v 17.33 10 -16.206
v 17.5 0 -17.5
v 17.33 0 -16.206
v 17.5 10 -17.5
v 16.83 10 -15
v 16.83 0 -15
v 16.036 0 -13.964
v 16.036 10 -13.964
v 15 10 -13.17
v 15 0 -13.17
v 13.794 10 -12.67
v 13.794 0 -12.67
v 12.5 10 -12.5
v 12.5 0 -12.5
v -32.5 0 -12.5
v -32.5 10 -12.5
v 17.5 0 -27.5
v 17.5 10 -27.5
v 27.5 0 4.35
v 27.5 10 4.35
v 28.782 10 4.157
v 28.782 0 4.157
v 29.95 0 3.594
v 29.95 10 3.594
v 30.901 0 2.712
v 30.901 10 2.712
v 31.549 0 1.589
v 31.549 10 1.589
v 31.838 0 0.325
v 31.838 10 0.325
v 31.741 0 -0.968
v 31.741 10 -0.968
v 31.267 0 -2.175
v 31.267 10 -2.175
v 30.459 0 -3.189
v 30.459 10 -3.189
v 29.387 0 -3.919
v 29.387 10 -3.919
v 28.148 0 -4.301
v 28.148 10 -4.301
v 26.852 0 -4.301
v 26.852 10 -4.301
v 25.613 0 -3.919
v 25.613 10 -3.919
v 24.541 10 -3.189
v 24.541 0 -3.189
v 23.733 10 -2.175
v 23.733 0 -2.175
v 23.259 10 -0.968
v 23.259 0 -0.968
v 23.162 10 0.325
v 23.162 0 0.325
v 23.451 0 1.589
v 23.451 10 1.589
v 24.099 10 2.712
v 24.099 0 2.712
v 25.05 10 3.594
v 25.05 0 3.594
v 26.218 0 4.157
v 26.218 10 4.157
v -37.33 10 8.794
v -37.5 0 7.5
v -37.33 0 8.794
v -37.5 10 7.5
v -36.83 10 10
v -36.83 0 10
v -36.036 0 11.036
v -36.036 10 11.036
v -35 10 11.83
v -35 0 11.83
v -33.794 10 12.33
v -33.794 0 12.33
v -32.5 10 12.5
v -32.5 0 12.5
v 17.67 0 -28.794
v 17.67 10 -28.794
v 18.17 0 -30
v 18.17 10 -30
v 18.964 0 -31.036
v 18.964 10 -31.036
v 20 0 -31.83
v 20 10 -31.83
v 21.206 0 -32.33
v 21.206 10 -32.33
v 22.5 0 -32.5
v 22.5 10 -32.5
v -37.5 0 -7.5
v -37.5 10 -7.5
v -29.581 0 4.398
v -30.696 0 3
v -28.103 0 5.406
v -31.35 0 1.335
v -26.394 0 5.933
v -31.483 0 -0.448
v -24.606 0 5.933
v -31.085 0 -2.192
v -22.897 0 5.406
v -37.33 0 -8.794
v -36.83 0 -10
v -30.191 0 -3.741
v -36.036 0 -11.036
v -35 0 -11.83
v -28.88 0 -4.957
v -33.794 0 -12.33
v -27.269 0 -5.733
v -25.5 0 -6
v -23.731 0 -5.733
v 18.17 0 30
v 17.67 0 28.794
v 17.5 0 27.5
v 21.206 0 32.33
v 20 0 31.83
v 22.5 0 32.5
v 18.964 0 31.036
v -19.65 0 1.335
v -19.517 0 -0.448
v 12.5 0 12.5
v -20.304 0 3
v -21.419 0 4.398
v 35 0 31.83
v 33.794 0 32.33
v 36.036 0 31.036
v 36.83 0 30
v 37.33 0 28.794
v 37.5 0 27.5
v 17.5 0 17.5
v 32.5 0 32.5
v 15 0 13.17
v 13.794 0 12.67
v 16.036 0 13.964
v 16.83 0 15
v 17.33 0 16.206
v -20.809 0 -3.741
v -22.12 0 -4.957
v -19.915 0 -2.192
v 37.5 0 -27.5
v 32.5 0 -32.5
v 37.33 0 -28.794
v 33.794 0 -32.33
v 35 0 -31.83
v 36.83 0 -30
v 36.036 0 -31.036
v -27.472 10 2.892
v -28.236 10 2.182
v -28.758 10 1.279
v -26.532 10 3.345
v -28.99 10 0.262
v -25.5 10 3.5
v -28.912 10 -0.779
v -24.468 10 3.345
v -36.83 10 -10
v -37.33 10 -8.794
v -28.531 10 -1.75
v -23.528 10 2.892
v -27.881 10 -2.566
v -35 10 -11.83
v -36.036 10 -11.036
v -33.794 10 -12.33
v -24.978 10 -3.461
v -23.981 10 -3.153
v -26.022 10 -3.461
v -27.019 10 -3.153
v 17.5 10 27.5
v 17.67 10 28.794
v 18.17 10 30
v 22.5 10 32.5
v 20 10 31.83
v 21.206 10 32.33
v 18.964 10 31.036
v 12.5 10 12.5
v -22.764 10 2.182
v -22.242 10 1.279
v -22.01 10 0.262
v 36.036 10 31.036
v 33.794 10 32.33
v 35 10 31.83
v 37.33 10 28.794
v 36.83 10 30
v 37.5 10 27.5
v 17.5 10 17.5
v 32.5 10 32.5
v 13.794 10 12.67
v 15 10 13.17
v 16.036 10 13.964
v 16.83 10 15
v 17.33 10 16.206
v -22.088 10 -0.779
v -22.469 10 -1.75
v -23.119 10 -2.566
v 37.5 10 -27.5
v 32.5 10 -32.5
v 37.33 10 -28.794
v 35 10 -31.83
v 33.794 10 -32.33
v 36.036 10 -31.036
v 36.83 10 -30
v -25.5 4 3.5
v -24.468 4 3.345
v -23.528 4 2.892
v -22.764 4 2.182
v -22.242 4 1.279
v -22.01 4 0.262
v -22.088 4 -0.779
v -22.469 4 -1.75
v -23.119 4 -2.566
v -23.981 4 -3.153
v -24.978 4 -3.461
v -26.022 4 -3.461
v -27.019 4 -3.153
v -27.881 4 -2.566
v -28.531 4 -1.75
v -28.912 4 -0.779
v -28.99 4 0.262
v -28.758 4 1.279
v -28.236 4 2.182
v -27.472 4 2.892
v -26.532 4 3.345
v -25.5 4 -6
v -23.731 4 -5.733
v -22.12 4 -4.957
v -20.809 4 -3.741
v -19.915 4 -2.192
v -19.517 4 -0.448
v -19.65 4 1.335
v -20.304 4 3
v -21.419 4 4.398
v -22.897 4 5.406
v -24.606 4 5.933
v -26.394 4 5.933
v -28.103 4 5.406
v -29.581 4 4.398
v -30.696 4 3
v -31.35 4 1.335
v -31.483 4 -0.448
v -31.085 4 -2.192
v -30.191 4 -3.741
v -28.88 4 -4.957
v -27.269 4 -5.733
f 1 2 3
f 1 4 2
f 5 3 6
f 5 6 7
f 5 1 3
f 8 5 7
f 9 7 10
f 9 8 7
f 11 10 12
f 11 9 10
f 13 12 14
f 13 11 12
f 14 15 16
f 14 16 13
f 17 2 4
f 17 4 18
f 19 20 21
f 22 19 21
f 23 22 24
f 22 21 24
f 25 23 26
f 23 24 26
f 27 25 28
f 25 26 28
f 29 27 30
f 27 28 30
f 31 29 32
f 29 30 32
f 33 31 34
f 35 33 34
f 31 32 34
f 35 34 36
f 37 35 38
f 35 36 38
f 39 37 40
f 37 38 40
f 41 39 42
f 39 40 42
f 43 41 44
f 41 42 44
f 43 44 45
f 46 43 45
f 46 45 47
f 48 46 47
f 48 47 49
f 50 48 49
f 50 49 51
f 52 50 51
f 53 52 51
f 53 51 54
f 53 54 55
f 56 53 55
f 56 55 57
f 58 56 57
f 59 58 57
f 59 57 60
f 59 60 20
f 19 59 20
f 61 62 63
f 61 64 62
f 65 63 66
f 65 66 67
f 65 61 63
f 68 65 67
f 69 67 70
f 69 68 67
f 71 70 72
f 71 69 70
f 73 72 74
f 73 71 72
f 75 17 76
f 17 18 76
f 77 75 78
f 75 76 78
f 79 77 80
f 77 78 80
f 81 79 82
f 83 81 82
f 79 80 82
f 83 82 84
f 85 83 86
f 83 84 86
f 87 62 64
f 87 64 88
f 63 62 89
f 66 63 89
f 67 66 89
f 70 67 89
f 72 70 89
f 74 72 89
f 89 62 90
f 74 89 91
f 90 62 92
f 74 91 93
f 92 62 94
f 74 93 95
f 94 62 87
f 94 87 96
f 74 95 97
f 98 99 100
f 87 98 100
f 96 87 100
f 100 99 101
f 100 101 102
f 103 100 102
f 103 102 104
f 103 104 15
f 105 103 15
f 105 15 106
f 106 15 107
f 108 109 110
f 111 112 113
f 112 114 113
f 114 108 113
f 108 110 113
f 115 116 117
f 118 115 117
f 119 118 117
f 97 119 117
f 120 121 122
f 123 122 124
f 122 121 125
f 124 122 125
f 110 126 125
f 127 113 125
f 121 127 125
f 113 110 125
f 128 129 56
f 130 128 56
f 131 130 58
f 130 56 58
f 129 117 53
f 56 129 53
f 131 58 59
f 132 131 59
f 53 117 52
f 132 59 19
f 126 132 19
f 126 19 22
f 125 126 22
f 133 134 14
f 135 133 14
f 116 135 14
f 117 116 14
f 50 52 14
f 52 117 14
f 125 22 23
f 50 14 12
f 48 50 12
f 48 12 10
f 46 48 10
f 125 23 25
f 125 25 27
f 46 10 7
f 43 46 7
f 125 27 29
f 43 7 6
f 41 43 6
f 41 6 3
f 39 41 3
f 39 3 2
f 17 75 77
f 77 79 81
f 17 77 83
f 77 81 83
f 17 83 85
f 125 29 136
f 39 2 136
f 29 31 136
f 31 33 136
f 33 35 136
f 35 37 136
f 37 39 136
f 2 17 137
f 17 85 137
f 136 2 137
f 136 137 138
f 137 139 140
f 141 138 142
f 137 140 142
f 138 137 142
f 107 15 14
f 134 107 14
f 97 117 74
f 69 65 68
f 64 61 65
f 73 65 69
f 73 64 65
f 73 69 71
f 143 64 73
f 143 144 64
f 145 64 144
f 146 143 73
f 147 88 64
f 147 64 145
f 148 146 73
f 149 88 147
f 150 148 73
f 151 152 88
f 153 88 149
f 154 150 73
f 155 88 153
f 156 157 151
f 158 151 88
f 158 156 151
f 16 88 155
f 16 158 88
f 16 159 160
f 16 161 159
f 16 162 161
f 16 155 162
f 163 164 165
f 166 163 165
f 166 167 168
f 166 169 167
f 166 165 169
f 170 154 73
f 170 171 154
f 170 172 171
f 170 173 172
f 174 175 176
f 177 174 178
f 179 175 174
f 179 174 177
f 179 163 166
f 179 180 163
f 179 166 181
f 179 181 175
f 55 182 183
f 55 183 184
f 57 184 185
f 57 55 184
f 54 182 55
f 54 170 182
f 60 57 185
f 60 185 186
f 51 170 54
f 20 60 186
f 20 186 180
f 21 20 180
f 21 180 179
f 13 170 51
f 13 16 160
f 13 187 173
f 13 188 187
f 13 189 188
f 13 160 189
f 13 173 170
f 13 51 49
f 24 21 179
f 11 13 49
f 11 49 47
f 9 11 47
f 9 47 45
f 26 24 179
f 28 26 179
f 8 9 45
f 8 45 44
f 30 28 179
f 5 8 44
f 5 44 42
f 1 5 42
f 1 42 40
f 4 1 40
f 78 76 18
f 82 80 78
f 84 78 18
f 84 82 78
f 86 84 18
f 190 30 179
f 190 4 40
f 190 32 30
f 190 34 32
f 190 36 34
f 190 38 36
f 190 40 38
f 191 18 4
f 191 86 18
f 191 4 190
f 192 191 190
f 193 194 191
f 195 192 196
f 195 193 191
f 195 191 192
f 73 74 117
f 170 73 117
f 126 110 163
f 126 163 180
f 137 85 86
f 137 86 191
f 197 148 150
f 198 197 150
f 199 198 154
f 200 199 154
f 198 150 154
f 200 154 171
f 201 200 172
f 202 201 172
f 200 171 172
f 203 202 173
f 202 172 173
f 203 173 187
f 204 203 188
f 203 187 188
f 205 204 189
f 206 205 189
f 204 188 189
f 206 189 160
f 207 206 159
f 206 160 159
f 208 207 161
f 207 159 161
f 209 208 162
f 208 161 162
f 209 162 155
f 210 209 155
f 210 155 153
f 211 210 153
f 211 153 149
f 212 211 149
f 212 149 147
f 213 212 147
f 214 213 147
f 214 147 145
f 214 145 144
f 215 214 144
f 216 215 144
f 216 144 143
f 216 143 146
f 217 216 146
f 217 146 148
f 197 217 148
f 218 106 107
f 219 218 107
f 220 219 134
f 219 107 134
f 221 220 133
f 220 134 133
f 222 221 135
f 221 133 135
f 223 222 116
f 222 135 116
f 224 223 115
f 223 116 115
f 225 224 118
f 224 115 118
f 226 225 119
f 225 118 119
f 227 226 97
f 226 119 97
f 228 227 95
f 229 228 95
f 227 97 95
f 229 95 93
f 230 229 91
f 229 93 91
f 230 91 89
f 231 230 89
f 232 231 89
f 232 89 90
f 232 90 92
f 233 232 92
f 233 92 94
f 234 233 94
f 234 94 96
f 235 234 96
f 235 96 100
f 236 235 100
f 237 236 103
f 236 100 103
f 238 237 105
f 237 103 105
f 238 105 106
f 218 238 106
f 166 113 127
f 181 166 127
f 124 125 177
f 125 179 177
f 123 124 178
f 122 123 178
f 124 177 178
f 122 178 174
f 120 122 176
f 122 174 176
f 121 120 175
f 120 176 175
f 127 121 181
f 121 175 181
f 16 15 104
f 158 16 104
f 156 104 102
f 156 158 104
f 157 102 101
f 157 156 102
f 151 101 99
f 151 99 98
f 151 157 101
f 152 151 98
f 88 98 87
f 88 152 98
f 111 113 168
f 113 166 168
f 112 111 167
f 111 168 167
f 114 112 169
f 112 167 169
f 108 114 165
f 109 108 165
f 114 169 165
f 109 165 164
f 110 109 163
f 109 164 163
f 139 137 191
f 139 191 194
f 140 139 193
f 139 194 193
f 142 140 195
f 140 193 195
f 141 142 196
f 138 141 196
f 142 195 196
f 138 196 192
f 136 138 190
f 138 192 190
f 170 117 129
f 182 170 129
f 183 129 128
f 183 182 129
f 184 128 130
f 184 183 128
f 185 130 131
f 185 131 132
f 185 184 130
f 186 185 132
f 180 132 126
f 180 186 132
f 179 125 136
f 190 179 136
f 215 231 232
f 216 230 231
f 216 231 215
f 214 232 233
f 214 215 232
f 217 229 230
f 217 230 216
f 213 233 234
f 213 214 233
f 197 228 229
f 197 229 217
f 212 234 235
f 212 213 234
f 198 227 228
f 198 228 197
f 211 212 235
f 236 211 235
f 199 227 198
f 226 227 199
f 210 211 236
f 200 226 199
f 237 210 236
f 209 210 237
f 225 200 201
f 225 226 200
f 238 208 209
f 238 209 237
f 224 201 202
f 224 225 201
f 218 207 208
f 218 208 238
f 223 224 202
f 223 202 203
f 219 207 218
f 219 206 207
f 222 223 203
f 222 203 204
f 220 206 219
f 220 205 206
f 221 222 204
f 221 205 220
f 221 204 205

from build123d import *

# Parameters (mm, degrees)
SKETCH1_W           = 20
SKETCH1_H           = 20
SKETCH1_W_2         = 75
SKETCH1_H_2         = 25
BOSS_EXTRUDE1_DEPTH = 10
CUT_EXTRUDE1_REACH  = 52.621
SKETCH2_R           = 3.5
SKETCH2_R_2         = 4.35
FILLET1_R           = 5
SKETCH3_R           = 6
CUT_EXTRUDE2_DEPTH  = 4


with BuildPart() as part:
    # Sketch1 → Boss-Extrude1 (new body)
    with BuildSketch(Plane(origin=(0, 0, 0), x_dir=(1, 0, 0), z_dir=(0, 1, 0))):
        with Locations((27.5, 22.5)):
            Rectangle(SKETCH1_W, SKETCH1_H)
        Rectangle(SKETCH1_W_2, SKETCH1_H_2)
        with Locations((27.5, -22.5)):
            Rectangle(SKETCH1_W, SKETCH1_H)
    extrude(amount=BOSS_EXTRUDE1_DEPTH)

    # Sketch2 → Cut-Extrude1 (cut, up to next)
    with BuildSketch(Plane(origin=(0, 10, 0), x_dir=(1, 0, 0), z_dir=(0, 1, 0)), mode=Mode.PRIVATE) as cut_extrude1_sk1:
        with Locations(Location((-25.5, 0, 0), (0, 0, 270))):
            Circle(SKETCH2_R)
    cut_extrude1_tool1 = extrude(cut_extrude1_sk1.sketch, amount=-CUT_EXTRUDE1_REACH, mode=Mode.PRIVATE) & part.part
    # Sketch2 → Cut-Extrude1 (cut, up to next)
    with BuildSketch(Plane(origin=(0, 10, 0), x_dir=(1, 0, 0), z_dir=(0, 1, 0)), mode=Mode.PRIVATE) as cut_extrude1_sk2:
        with Locations(Location((27.5, 0, 0), (0, 0, 270))):
            Circle(SKETCH2_R_2)
    cut_extrude1_tool2 = extrude(cut_extrude1_sk2.sketch, amount=-CUT_EXTRUDE1_REACH, mode=Mode.PRIVATE) & part.part
    add(cut_extrude1_tool1.solids().sort_by_distance((-25.5, 10, 0))[0], mode=Mode.SUBTRACT)
    add(cut_extrude1_tool2.solids().sort_by_distance((27.5, 10, 0))[0], mode=Mode.SUBTRACT)

    # Fillet1
    fillet1_edges = [part.edges().sort_by_distance(p)[0] for p in [
        (17.5, 5, -32.5),
        (37.5, 5, -32.5),
        (37.5, 5, 32.5),
        (17.5, 5, 32.5),
        (17.5, 5, 12.5),
        (-37.5, 5, 12.5),
        (-37.5, 5, -12.5),
        (17.5, 5, -12.5),
    ]]
    fillet(fillet1_edges, radius=FILLET1_R)

    # Sketch3 → Cut-Extrude2 (cut)
    with BuildSketch(Plane.XZ):
        with Locations(Location((-25.5, 0, 0), (0, 0, 270))):
            Circle(SKETCH3_R)
    extrude(amount=-CUT_EXTRUDE2_DEPTH, mode=Mode.SUBTRACT)


solid = part.part
